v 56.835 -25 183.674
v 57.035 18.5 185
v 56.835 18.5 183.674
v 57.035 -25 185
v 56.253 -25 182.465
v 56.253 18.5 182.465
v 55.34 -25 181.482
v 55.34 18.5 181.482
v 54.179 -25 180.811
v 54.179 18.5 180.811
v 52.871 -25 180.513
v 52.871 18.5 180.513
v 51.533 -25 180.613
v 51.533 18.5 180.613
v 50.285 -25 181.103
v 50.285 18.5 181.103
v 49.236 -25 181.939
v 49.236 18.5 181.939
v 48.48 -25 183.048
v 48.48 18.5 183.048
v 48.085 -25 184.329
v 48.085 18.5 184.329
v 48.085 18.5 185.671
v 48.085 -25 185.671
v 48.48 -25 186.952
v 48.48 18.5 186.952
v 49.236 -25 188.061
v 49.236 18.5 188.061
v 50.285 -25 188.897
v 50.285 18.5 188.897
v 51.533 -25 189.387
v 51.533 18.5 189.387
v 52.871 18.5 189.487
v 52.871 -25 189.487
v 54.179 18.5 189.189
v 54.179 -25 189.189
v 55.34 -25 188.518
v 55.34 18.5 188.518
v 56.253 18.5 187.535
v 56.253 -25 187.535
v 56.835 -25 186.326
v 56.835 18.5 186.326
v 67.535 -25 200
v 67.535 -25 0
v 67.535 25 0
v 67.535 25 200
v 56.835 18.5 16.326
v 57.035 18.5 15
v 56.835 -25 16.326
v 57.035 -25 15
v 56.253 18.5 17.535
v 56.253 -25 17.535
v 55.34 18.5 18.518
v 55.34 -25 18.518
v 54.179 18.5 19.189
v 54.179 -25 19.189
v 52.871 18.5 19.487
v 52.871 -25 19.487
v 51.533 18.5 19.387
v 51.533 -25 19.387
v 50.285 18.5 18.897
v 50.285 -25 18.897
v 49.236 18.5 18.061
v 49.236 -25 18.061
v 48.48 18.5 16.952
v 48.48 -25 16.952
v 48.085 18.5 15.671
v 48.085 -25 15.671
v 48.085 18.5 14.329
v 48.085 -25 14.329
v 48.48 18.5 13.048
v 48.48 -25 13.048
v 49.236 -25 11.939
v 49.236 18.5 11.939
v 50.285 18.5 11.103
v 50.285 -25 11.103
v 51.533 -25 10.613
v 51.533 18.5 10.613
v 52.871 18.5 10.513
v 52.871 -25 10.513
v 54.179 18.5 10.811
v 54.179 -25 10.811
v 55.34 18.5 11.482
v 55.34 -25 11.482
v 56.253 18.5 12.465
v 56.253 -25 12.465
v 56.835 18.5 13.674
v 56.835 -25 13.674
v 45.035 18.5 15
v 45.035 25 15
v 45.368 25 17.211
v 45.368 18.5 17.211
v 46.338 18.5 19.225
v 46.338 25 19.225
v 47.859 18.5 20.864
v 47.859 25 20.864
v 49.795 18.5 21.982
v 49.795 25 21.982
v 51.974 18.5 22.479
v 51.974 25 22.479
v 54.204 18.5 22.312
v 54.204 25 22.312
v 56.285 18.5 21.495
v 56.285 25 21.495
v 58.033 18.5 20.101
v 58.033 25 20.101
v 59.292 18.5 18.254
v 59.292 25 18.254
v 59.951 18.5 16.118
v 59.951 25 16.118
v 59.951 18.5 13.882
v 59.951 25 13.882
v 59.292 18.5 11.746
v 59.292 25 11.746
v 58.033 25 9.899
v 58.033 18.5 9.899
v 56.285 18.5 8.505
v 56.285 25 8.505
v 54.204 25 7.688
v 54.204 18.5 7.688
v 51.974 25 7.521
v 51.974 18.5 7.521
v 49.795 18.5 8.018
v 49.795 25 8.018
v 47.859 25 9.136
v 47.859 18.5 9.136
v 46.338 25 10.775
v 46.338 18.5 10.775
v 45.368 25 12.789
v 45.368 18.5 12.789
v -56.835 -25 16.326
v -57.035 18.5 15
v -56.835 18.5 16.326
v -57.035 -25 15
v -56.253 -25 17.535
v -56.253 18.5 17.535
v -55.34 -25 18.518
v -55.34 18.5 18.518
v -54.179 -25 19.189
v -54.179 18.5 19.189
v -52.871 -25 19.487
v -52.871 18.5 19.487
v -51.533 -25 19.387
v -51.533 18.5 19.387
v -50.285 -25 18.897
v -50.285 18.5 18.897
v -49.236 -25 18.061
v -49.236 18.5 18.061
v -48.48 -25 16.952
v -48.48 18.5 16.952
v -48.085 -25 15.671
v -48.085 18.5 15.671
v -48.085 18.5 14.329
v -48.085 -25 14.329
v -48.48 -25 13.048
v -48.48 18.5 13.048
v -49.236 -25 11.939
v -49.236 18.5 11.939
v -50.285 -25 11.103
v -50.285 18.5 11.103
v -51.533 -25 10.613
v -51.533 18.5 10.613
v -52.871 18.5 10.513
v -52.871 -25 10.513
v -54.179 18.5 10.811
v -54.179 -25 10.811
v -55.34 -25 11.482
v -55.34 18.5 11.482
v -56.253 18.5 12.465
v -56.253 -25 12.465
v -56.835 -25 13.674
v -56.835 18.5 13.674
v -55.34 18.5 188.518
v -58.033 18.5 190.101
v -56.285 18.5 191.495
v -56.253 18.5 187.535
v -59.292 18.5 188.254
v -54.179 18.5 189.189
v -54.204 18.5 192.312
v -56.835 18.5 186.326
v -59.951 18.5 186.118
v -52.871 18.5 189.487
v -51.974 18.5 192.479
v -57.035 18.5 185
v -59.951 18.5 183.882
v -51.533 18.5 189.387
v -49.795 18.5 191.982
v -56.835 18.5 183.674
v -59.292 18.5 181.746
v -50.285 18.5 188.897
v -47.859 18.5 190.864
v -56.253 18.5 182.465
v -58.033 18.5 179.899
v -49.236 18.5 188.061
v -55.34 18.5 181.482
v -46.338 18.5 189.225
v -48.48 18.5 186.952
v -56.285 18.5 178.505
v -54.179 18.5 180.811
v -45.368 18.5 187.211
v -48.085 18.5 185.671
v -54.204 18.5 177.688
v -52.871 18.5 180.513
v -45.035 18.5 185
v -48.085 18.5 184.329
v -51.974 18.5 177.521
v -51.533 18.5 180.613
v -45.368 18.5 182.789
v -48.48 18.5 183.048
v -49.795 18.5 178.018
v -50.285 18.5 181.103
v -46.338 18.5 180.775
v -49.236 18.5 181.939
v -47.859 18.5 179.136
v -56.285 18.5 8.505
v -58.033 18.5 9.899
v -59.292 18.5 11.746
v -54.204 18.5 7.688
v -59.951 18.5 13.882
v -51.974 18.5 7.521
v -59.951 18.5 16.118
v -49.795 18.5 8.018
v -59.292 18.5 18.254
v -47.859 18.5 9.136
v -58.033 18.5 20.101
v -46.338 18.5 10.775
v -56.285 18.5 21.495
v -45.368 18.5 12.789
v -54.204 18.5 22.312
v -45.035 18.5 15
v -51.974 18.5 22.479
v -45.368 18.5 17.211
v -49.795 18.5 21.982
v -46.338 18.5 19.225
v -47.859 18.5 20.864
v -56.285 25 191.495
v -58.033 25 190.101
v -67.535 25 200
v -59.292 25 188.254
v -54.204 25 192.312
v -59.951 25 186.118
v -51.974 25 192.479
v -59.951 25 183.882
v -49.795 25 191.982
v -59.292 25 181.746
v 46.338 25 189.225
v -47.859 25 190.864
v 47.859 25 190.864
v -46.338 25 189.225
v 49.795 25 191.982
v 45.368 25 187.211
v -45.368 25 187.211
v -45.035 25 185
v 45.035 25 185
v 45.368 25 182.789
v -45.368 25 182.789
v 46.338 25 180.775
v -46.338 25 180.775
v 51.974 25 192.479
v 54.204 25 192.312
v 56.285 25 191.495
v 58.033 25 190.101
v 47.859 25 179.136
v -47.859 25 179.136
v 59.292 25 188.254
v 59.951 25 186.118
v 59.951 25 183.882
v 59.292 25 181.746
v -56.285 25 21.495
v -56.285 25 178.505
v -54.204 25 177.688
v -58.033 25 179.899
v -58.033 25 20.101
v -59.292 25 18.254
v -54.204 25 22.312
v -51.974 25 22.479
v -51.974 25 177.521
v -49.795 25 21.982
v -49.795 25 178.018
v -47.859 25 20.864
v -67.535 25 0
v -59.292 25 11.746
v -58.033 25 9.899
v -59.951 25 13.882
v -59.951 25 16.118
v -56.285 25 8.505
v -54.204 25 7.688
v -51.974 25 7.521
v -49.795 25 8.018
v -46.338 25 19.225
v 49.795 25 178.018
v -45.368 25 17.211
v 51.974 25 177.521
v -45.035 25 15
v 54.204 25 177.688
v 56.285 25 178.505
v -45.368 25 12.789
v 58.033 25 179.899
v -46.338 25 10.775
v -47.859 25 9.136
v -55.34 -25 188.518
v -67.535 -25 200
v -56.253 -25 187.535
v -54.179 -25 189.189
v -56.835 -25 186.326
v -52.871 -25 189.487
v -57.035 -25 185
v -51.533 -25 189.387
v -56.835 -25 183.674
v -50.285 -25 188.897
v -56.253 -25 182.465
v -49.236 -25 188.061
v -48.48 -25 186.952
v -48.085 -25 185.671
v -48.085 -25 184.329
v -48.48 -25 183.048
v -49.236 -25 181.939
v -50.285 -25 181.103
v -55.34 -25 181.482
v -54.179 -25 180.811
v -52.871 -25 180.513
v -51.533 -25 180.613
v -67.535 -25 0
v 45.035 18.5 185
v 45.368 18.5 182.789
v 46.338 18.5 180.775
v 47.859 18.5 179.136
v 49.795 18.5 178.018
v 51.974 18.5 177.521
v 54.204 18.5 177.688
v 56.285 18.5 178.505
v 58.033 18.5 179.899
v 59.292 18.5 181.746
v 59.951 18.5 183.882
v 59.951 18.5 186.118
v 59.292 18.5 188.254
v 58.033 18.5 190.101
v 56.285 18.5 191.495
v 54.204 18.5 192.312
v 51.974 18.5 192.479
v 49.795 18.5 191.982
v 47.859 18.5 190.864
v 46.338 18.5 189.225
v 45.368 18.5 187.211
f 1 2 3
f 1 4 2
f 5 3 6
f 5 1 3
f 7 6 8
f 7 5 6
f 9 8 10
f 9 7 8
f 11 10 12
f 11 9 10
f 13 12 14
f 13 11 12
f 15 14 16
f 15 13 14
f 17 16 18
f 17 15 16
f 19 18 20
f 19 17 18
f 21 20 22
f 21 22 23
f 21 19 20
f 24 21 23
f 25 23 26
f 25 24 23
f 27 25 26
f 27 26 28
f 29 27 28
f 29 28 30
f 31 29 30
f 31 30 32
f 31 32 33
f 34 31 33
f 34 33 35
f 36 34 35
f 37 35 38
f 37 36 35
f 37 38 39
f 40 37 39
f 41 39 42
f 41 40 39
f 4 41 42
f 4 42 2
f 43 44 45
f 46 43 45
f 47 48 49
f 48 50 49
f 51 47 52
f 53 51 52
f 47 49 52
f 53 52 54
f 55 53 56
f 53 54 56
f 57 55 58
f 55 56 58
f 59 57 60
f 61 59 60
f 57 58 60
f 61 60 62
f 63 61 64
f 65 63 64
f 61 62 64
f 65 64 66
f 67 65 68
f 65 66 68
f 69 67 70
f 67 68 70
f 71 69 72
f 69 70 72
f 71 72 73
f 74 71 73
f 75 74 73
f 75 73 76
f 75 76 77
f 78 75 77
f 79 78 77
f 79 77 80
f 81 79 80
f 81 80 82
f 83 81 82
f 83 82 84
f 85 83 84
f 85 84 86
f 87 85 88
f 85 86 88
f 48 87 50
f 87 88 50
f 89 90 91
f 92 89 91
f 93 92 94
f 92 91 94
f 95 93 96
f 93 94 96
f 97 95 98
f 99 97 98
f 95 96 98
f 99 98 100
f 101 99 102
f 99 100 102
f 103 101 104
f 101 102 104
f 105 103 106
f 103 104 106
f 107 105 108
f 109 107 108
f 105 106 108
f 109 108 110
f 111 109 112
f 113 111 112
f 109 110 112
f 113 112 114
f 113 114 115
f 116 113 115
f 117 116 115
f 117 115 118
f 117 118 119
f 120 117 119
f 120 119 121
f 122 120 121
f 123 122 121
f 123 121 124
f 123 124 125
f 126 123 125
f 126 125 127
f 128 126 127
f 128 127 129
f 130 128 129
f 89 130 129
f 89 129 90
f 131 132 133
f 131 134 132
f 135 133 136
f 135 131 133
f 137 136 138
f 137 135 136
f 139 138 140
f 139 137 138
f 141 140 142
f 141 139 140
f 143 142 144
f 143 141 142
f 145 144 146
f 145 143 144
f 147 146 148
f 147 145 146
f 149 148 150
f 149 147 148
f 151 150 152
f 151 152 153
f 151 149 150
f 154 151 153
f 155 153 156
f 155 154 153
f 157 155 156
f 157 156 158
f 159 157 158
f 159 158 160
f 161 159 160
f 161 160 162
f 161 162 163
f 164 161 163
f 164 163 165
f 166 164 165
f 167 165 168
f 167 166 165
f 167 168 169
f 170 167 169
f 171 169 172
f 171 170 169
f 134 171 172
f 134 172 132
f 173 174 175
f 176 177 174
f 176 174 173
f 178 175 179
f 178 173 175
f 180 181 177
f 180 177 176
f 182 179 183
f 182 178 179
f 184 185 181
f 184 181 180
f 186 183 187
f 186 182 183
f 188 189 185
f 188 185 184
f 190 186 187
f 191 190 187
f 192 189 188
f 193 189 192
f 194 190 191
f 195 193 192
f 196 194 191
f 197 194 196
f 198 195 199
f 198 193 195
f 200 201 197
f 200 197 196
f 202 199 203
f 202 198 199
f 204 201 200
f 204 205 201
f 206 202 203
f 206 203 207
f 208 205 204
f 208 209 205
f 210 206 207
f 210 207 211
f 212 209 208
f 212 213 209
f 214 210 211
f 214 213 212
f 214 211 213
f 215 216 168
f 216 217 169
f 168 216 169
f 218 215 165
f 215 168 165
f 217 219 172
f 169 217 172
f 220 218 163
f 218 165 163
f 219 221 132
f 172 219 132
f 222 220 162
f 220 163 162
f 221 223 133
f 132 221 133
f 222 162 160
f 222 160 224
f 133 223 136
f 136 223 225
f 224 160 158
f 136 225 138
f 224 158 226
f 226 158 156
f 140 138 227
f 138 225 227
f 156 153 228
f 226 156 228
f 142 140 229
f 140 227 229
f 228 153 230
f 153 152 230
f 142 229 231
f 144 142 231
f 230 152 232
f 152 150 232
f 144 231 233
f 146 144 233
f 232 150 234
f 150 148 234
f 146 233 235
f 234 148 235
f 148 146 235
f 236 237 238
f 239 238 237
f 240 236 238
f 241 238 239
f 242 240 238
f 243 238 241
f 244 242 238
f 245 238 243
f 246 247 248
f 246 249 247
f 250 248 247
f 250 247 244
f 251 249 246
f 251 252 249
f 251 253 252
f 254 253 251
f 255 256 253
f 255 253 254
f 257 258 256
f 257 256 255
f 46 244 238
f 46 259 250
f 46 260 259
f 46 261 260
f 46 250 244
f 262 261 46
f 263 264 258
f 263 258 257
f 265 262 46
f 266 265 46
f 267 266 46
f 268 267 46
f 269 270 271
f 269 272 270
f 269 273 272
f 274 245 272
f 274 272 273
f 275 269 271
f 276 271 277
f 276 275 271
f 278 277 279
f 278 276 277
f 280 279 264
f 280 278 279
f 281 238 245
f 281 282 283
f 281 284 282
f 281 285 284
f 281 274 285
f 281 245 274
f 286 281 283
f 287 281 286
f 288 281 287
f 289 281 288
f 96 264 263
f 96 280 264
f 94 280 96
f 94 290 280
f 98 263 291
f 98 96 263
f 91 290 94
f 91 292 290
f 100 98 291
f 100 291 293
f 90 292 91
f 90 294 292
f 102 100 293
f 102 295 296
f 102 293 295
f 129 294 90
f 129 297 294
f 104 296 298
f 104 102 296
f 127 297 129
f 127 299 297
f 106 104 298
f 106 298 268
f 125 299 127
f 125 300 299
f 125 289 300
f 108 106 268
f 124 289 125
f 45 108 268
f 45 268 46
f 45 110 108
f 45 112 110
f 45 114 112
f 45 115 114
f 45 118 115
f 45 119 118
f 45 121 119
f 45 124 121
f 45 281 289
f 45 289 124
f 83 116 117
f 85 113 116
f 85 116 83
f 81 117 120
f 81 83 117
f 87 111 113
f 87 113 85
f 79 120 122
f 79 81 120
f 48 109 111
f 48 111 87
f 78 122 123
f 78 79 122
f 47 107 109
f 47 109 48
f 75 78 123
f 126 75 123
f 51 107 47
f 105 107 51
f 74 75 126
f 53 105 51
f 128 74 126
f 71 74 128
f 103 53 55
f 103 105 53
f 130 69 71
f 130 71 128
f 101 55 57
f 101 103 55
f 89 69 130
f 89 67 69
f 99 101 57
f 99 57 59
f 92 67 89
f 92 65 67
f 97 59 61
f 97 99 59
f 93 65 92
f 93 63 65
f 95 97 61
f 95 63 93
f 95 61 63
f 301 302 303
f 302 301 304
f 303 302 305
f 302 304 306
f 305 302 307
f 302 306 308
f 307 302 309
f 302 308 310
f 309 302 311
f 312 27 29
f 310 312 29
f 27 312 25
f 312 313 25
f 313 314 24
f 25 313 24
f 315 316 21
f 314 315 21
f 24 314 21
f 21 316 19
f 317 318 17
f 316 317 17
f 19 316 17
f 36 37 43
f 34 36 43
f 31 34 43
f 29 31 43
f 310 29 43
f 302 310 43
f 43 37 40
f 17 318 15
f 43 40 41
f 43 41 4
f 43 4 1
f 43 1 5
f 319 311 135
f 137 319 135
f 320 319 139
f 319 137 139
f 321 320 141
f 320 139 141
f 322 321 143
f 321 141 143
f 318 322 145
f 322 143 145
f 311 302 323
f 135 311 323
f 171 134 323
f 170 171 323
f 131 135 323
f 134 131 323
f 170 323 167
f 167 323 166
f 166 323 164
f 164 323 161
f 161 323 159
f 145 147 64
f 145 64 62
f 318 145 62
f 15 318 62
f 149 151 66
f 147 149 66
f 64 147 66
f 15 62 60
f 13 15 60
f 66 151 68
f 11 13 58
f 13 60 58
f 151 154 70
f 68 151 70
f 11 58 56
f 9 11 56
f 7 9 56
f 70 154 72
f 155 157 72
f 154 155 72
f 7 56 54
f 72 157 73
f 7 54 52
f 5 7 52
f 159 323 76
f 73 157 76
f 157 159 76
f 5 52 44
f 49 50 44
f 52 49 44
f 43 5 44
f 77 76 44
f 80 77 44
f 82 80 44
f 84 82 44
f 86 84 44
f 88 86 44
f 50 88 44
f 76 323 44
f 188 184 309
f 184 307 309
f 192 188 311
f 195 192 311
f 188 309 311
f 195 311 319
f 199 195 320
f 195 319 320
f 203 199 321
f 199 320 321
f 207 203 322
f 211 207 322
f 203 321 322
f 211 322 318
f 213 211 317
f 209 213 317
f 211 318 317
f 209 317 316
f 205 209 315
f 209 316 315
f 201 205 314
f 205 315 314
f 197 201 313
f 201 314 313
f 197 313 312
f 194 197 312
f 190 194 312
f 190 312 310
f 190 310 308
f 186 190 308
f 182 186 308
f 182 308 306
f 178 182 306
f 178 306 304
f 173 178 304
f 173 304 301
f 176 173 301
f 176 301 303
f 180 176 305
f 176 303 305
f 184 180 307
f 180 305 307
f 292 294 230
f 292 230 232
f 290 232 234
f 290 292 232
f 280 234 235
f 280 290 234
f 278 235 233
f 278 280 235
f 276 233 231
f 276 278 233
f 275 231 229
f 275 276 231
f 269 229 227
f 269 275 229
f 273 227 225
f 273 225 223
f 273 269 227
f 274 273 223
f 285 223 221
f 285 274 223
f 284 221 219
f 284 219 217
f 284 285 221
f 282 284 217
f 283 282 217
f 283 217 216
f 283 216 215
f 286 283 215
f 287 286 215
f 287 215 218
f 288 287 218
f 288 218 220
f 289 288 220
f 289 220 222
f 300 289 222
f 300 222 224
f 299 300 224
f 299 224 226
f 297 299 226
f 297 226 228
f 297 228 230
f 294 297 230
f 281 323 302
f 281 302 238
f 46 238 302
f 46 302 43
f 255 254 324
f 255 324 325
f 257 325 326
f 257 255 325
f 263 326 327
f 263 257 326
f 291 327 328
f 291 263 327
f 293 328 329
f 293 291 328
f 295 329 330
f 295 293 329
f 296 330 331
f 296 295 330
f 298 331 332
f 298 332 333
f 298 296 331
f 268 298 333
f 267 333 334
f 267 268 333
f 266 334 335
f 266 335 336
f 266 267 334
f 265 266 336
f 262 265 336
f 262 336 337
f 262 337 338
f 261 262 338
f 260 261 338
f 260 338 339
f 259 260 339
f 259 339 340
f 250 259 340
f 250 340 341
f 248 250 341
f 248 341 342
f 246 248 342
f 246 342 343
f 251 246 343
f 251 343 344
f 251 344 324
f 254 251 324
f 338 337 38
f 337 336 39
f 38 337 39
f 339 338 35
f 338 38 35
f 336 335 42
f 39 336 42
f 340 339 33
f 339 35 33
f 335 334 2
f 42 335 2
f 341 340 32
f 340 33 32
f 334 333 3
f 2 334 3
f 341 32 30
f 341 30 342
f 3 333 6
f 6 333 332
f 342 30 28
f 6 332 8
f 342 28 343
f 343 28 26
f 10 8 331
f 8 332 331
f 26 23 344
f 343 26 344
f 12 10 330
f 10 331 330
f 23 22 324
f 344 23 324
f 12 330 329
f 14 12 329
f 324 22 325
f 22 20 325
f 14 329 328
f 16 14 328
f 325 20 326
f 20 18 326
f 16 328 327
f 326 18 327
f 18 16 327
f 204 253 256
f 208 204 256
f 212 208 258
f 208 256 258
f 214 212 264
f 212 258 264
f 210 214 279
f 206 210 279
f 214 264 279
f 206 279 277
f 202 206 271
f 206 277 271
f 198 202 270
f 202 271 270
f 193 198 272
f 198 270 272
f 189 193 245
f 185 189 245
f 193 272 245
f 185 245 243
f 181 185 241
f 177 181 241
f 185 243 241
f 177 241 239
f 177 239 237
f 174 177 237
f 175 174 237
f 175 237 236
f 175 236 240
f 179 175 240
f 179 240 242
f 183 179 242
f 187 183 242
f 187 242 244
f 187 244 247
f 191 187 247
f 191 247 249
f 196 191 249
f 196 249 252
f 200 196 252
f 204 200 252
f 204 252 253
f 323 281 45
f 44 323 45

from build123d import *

# Parameters (mm, degrees)
SKIZZE1_W                                           = 135.069444444
SKIZZE1_H                                           = 50
AUFSATZ_LINEAR_AUSTRAGEN1_DEPTH                     = 200
STIRNSENKUNG_F_R_M8_SENKSCHRAUBE_KOPF_B_D           = 9
STIRNSENKUNG_F_R_M8_SENKSCHRAUBE_KOPF_B_CBORE_D     = 15
STIRNSENKUNG_F_R_M8_SENKSCHRAUBE_KOPF_B_CBORE_DEPTH = 6.5
SPIEGELN3_COPY_1_D                                  = 9
SPIEGELN3_COPY_1_CBORE_D                            = 15
SPIEGELN3_COPY_1_CBORE_DEPTH                        = 6.5


with BuildPart() as part:
    # Skizze1 → Aufsatz-Linear austragen1 (new body)
    with BuildSketch(Plane.XY):
        Rectangle(SKIZZE1_W, SKIZZE1_H)
    extrude(amount=AUFSATZ_LINEAR_AUSTRAGEN1_DEPTH)

    # Stirnsenkung für M8 Senkschraube (Kopf Button)4 (through all)
    with Locations(Plane(origin=(0, 25, 0), x_dir=(1, 0, 0), z_dir=(0, 1, 0))):
        with Locations((-52.534722222, -185)):
            stirnsenkung_f_r_m8_senkschraube_kopf_b = CounterBoreHole(STIRNSENKUNG_F_R_M8_SENKSCHRAUBE_KOPF_B_D / 2, STIRNSENKUNG_F_R_M8_SENKSCHRAUBE_KOPF_B_CBORE_D / 2, STIRNSENKUNG_F_R_M8_SENKSCHRAUBE_KOPF_B_CBORE_DEPTH)

    # Spiegeln2: Stirnsenkung für M8 Senkschraube (Kopf Button)4 across plane
    add(stirnsenkung_f_r_m8_senkschraube_kopf_b.mirror(Plane(origin=(0, 0, 0), x_dir=(0, 0, 1), z_dir=(1, 0, 0))), mode=Mode.SUBTRACT)

    # Spiegeln3: Stirnsenkung für M8 Senkschraube (Kopf Button)4 across plane
    add(stirnsenkung_f_r_m8_senkschraube_kopf_b.mirror(Plane.XY.offset(100)), mode=Mode.SUBTRACT)

    # Spiegeln3 copy 1 (through all)
    with Locations(Plane(origin=(0, 25, 200), x_dir=(-1, 0, 0), z_dir=(0, 1, 0))):
        with Locations((-52.534722222, -185)):
            CounterBoreHole(SPIEGELN3_COPY_1_D / 2, SPIEGELN3_COPY_1_CBORE_D / 2, SPIEGELN3_COPY_1_CBORE_DEPTH)


solid = part.part
